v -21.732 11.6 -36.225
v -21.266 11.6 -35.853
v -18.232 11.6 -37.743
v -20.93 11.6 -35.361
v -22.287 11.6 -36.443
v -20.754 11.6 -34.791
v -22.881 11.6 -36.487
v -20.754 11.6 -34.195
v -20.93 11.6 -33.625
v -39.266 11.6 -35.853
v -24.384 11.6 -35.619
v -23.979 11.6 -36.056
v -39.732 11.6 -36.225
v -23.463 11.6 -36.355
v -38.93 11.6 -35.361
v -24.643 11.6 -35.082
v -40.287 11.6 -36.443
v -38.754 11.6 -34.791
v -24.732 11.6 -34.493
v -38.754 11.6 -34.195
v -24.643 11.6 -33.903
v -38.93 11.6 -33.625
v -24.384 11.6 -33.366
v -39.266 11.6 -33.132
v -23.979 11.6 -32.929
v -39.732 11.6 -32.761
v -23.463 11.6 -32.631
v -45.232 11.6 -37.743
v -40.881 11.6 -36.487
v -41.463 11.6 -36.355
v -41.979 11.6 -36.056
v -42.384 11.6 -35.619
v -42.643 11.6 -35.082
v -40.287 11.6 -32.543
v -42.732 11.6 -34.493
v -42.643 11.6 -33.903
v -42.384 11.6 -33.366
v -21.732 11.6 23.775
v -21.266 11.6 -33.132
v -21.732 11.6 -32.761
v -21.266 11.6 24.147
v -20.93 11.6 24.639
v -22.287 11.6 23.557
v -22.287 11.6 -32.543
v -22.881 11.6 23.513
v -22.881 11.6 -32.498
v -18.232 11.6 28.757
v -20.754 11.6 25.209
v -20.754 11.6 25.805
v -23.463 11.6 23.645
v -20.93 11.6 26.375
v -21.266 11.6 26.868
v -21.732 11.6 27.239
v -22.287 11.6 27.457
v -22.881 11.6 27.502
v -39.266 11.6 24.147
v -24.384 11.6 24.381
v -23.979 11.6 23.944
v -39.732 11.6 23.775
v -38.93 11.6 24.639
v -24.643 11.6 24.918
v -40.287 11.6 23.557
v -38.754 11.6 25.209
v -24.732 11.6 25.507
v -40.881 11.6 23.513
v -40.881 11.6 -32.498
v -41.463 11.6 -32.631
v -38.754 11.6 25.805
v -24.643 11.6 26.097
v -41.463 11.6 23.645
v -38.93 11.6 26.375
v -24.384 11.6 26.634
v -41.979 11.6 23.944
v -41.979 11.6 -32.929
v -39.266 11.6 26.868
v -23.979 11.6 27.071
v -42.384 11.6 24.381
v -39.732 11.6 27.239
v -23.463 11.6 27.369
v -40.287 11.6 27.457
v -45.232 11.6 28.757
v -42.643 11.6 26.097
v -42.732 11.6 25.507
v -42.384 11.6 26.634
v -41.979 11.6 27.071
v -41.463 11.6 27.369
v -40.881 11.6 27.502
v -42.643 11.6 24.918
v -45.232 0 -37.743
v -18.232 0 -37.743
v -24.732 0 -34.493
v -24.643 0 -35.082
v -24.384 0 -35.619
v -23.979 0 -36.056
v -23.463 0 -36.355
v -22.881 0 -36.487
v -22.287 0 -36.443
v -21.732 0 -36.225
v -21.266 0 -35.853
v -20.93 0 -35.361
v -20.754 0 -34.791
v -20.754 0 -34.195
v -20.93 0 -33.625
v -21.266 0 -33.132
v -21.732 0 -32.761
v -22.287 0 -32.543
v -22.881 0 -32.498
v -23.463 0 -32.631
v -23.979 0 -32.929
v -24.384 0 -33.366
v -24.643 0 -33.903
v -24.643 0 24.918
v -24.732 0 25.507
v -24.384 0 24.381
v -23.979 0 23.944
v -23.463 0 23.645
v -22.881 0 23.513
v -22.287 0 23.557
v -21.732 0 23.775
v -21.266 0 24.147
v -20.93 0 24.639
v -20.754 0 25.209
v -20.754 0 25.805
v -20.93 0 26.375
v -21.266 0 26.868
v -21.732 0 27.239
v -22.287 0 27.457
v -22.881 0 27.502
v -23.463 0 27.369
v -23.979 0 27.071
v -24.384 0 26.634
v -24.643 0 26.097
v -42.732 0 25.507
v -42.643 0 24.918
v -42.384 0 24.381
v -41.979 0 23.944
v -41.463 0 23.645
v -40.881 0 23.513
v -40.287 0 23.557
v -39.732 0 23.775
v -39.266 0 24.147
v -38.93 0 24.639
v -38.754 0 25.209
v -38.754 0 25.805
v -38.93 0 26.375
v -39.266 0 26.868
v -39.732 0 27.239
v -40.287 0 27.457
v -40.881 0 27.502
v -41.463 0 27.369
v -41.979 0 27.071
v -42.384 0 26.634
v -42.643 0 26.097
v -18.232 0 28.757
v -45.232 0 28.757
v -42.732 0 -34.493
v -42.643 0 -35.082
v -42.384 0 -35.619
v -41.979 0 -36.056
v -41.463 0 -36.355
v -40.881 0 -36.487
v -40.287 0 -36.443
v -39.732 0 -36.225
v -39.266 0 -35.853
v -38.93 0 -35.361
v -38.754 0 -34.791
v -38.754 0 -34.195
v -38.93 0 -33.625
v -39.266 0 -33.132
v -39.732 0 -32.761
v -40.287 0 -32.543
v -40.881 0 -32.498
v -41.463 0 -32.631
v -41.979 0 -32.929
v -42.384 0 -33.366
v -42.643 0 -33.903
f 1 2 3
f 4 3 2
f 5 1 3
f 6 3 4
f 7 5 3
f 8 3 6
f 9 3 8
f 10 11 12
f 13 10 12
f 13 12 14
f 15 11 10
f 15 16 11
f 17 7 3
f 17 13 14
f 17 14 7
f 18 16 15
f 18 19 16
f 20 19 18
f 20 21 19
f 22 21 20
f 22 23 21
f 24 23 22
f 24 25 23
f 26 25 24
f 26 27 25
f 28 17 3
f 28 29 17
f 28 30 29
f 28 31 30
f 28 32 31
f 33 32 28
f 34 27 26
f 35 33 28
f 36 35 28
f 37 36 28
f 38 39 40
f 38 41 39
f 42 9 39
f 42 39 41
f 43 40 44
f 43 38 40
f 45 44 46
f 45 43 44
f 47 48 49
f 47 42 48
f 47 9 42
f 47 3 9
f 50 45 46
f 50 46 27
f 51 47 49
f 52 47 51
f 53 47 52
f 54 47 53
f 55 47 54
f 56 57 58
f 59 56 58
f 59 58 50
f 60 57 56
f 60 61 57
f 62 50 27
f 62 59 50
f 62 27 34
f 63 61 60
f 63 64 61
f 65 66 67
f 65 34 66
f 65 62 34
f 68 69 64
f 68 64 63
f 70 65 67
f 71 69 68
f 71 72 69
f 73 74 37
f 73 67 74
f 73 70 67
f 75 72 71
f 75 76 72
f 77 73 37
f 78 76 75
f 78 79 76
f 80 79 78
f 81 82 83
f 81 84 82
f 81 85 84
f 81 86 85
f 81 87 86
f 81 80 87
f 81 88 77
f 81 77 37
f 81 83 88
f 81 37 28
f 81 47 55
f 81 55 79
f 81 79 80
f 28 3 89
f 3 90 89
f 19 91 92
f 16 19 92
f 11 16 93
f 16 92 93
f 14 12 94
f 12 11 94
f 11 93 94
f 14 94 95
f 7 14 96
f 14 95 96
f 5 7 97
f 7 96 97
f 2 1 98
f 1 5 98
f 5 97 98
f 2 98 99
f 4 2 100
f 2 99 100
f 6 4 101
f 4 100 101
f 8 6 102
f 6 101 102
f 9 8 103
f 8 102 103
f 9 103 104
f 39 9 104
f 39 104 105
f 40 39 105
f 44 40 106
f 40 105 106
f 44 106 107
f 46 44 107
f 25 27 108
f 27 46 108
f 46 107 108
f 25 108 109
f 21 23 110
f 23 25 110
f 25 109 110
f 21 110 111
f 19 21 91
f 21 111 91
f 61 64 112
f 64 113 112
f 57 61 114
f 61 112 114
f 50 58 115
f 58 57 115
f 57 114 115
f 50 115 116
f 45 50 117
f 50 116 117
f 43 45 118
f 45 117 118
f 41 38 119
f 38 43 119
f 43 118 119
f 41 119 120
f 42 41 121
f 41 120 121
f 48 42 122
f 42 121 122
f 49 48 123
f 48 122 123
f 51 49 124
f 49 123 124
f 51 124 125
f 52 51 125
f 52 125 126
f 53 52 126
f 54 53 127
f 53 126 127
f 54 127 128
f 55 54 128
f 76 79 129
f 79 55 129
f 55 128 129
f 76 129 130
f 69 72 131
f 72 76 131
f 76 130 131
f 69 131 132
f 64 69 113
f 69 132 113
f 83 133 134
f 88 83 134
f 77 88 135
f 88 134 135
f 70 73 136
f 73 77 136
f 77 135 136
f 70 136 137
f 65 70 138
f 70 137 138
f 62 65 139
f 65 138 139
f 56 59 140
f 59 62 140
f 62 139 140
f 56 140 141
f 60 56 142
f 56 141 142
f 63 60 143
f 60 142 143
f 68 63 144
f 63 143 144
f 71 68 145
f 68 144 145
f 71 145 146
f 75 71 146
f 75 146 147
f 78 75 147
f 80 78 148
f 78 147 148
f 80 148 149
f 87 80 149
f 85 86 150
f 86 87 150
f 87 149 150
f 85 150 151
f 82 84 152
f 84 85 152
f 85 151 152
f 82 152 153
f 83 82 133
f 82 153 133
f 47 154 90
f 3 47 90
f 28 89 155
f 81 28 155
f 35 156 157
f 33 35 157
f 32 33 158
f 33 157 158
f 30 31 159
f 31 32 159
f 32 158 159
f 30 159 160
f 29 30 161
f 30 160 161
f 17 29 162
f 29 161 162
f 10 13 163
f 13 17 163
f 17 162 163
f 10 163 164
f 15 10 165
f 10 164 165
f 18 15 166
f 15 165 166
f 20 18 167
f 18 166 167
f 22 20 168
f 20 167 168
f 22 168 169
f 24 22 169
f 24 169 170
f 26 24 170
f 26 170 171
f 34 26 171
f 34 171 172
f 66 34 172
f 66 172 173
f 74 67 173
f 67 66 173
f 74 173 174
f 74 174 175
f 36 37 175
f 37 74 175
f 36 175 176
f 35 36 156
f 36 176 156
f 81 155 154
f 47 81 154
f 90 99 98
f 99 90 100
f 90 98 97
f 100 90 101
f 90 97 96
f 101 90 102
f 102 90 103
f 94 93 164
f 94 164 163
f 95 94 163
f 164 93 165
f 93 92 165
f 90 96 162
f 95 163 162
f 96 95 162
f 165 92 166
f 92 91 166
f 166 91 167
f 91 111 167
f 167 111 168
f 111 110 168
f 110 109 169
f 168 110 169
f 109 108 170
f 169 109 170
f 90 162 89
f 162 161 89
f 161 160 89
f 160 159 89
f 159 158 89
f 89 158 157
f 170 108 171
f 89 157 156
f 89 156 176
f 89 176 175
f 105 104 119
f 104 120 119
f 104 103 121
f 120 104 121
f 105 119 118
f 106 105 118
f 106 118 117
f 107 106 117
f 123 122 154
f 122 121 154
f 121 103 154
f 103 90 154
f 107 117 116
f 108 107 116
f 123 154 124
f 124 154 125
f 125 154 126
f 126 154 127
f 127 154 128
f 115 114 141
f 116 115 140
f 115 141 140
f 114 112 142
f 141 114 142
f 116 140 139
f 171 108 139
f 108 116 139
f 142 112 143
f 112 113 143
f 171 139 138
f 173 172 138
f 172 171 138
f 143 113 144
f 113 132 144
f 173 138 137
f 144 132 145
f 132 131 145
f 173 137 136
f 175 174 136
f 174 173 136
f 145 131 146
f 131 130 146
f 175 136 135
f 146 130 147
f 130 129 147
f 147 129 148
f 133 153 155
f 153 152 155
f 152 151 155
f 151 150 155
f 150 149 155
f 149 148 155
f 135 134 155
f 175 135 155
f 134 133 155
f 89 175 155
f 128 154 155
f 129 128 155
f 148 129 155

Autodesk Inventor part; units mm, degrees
ref_plane "YZ Plane" through (0, 0, 0) normal (1, 0, 0) x (0, 1, 0)
ref_plane "XZ Plane" through (0, 0, 0) normal (0, 1, 0) x (-1, 0, 0)
ref_plane "XY Plane" through (0, 0, 0) normal (0, 0, 1) x (1, 0, 0)
sketch "Sketch1" plane through (0, 0, 0) normal (0, 1, 0) x (-1, 0, 0)
  line L0 (45.232, 28.7572) -> (18.232, 28.7572)
  line L1 (18.232, 28.7572) -> (18.232, -37.7428)
  line L2 (18.232, -37.7428) -> (45.232, -37.7428)
  line L3 (45.232, -37.7428) -> (45.232, 28.7572)
  circle A0 centre (40.732, -34.4928) radius 2
  circle A1 centre (22.732, -34.4928) radius 2
  circle A2 centre (40.732, 25.5072) radius 2
  circle A3 centre (22.732, 25.5072) radius 2
  point P0 (0, 0)
  dimension "d0" = 66.5
  dimension "d1" = 27
  dimension "d2" = 4
  dimension "d3" = 4
  dimension "d4" = 18
  dimension "d5" = 4.5
  dimension "d6" = 4
  dimension "d7" = 60
  dimension "d9" = 4
  dimension "d10" = 18
  dimension "d11" = 60
  dimension "d15" = 3.25
  dimension "d16" = 3.25
extrude "Extrusion1" add sketch "Sketch1" along normal blind 11.6
properties part number "openCM904" material "Titanium"
